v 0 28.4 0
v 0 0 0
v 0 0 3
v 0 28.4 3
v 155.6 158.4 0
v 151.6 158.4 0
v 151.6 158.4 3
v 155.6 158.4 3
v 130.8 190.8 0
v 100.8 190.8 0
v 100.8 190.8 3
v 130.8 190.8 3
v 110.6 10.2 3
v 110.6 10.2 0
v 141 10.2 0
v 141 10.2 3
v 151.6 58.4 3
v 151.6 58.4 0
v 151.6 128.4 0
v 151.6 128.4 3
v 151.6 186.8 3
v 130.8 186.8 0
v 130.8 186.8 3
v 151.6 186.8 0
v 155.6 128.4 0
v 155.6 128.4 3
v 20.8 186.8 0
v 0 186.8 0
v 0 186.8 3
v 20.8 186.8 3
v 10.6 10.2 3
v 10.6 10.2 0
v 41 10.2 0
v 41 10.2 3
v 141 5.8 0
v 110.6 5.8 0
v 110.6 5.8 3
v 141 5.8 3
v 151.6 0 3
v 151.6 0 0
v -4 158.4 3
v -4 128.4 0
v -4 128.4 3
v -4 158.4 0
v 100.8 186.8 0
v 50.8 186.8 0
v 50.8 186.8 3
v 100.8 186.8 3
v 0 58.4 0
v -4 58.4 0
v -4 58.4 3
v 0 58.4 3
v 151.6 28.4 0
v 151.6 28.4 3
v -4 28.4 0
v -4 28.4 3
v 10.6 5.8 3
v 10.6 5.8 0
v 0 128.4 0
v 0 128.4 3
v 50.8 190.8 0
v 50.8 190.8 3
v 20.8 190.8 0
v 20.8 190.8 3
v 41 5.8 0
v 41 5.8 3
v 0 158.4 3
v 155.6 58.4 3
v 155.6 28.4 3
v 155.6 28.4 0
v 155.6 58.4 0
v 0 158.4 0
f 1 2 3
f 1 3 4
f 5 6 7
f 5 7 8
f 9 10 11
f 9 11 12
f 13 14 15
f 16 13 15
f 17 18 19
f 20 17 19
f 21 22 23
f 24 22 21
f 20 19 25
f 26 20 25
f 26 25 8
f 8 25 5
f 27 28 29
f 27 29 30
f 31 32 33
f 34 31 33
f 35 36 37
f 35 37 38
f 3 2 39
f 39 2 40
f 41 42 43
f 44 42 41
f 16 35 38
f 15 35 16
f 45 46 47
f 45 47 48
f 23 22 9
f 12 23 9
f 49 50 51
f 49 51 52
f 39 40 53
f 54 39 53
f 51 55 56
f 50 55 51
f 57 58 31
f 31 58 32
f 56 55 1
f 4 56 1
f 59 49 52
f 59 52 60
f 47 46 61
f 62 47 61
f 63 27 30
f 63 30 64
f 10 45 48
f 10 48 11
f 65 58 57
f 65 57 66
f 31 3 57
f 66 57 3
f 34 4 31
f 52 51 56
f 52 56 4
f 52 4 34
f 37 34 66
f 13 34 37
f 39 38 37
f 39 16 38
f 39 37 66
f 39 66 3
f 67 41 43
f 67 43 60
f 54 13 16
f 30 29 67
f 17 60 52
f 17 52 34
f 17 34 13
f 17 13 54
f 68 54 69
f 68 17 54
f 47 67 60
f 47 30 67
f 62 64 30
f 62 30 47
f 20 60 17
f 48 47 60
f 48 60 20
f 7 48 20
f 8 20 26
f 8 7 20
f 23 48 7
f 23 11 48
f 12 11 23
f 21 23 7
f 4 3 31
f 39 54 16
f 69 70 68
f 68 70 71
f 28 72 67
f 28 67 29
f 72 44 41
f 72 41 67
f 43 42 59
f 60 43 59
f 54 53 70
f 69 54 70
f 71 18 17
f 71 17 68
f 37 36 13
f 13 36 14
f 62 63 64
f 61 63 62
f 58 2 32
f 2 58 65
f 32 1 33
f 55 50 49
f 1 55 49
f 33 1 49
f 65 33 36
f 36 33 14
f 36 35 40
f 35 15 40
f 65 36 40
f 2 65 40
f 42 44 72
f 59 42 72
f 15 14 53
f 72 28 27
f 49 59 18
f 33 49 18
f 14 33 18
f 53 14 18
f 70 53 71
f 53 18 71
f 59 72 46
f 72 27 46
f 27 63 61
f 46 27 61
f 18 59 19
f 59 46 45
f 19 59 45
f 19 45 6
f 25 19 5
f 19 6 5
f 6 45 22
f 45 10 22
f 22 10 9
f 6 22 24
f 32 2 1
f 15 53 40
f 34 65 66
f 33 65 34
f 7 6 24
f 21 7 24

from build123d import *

# Parameters (mm, degrees)
SKETCH_1_W      = 151.6
SKETCH_1_H      = 186.8
SKETCH_1_W_2    = 30.4
SKETCH_1_H_2    = 4.4
SKETCH_1_W_3    = 4
SKETCH_1_H_3    = 30
SKETCH_1_W_4    = 30
SKETCH_1_H_4    = 4
EXTRUDE_1_DEPTH = 3


with BuildPart() as part:
    # Эскиз1 → Бобышка-Вытянуть1 (new body)
    # profile 1 of 7: a face of its own
    with BuildSketch(Plane.XY):
        with Locations((75.8, 93.4)):
            Rectangle(SKETCH_1_W, SKETCH_1_H)
        with Locations((25.8, 8)):
            Rectangle(SKETCH_1_W_2, SKETCH_1_H_2, mode=Mode.SUBTRACT)
        with Locations((125.8, 8)):
            Rectangle(SKETCH_1_W_2, SKETCH_1_H_2, mode=Mode.SUBTRACT)
    # profile 2 of 7: a face of its own
    with BuildSketch(Plane.XY):
        with Locations((-2, 43.4)):
            Rectangle(SKETCH_1_W_3, SKETCH_1_H_3)
    # profile 3 of 7: a face of its own
    with BuildSketch(Plane.XY):
        with Locations((-2, 143.4)):
            Rectangle(SKETCH_1_W_3, SKETCH_1_H_3)
    # profile 4 of 7: a face of its own
    with BuildSketch(Plane.XY):
        with Locations((153.6, 143.4)):
            Rectangle(SKETCH_1_W_3, SKETCH_1_H_3)
    # profile 5 of 7: a face of its own
    with BuildSketch(Plane.XY):
        with Locations((153.6, 43.4)):
            Rectangle(SKETCH_1_W_3, SKETCH_1_H_3)
    # profile 6 of 7: a face of its own
    with BuildSketch(Plane.XY):
        with Locations((35.8, 188.8)):
            Rectangle(SKETCH_1_W_4, SKETCH_1_H_4)
    # profile 7 of 7: a face of its own
    with BuildSketch(Plane.XY):
        with Locations((115.8, 188.8)):
            Rectangle(SKETCH_1_W_4, SKETCH_1_H_4)
    extrude(amount=EXTRUDE_1_DEPTH)


solid = part.part
